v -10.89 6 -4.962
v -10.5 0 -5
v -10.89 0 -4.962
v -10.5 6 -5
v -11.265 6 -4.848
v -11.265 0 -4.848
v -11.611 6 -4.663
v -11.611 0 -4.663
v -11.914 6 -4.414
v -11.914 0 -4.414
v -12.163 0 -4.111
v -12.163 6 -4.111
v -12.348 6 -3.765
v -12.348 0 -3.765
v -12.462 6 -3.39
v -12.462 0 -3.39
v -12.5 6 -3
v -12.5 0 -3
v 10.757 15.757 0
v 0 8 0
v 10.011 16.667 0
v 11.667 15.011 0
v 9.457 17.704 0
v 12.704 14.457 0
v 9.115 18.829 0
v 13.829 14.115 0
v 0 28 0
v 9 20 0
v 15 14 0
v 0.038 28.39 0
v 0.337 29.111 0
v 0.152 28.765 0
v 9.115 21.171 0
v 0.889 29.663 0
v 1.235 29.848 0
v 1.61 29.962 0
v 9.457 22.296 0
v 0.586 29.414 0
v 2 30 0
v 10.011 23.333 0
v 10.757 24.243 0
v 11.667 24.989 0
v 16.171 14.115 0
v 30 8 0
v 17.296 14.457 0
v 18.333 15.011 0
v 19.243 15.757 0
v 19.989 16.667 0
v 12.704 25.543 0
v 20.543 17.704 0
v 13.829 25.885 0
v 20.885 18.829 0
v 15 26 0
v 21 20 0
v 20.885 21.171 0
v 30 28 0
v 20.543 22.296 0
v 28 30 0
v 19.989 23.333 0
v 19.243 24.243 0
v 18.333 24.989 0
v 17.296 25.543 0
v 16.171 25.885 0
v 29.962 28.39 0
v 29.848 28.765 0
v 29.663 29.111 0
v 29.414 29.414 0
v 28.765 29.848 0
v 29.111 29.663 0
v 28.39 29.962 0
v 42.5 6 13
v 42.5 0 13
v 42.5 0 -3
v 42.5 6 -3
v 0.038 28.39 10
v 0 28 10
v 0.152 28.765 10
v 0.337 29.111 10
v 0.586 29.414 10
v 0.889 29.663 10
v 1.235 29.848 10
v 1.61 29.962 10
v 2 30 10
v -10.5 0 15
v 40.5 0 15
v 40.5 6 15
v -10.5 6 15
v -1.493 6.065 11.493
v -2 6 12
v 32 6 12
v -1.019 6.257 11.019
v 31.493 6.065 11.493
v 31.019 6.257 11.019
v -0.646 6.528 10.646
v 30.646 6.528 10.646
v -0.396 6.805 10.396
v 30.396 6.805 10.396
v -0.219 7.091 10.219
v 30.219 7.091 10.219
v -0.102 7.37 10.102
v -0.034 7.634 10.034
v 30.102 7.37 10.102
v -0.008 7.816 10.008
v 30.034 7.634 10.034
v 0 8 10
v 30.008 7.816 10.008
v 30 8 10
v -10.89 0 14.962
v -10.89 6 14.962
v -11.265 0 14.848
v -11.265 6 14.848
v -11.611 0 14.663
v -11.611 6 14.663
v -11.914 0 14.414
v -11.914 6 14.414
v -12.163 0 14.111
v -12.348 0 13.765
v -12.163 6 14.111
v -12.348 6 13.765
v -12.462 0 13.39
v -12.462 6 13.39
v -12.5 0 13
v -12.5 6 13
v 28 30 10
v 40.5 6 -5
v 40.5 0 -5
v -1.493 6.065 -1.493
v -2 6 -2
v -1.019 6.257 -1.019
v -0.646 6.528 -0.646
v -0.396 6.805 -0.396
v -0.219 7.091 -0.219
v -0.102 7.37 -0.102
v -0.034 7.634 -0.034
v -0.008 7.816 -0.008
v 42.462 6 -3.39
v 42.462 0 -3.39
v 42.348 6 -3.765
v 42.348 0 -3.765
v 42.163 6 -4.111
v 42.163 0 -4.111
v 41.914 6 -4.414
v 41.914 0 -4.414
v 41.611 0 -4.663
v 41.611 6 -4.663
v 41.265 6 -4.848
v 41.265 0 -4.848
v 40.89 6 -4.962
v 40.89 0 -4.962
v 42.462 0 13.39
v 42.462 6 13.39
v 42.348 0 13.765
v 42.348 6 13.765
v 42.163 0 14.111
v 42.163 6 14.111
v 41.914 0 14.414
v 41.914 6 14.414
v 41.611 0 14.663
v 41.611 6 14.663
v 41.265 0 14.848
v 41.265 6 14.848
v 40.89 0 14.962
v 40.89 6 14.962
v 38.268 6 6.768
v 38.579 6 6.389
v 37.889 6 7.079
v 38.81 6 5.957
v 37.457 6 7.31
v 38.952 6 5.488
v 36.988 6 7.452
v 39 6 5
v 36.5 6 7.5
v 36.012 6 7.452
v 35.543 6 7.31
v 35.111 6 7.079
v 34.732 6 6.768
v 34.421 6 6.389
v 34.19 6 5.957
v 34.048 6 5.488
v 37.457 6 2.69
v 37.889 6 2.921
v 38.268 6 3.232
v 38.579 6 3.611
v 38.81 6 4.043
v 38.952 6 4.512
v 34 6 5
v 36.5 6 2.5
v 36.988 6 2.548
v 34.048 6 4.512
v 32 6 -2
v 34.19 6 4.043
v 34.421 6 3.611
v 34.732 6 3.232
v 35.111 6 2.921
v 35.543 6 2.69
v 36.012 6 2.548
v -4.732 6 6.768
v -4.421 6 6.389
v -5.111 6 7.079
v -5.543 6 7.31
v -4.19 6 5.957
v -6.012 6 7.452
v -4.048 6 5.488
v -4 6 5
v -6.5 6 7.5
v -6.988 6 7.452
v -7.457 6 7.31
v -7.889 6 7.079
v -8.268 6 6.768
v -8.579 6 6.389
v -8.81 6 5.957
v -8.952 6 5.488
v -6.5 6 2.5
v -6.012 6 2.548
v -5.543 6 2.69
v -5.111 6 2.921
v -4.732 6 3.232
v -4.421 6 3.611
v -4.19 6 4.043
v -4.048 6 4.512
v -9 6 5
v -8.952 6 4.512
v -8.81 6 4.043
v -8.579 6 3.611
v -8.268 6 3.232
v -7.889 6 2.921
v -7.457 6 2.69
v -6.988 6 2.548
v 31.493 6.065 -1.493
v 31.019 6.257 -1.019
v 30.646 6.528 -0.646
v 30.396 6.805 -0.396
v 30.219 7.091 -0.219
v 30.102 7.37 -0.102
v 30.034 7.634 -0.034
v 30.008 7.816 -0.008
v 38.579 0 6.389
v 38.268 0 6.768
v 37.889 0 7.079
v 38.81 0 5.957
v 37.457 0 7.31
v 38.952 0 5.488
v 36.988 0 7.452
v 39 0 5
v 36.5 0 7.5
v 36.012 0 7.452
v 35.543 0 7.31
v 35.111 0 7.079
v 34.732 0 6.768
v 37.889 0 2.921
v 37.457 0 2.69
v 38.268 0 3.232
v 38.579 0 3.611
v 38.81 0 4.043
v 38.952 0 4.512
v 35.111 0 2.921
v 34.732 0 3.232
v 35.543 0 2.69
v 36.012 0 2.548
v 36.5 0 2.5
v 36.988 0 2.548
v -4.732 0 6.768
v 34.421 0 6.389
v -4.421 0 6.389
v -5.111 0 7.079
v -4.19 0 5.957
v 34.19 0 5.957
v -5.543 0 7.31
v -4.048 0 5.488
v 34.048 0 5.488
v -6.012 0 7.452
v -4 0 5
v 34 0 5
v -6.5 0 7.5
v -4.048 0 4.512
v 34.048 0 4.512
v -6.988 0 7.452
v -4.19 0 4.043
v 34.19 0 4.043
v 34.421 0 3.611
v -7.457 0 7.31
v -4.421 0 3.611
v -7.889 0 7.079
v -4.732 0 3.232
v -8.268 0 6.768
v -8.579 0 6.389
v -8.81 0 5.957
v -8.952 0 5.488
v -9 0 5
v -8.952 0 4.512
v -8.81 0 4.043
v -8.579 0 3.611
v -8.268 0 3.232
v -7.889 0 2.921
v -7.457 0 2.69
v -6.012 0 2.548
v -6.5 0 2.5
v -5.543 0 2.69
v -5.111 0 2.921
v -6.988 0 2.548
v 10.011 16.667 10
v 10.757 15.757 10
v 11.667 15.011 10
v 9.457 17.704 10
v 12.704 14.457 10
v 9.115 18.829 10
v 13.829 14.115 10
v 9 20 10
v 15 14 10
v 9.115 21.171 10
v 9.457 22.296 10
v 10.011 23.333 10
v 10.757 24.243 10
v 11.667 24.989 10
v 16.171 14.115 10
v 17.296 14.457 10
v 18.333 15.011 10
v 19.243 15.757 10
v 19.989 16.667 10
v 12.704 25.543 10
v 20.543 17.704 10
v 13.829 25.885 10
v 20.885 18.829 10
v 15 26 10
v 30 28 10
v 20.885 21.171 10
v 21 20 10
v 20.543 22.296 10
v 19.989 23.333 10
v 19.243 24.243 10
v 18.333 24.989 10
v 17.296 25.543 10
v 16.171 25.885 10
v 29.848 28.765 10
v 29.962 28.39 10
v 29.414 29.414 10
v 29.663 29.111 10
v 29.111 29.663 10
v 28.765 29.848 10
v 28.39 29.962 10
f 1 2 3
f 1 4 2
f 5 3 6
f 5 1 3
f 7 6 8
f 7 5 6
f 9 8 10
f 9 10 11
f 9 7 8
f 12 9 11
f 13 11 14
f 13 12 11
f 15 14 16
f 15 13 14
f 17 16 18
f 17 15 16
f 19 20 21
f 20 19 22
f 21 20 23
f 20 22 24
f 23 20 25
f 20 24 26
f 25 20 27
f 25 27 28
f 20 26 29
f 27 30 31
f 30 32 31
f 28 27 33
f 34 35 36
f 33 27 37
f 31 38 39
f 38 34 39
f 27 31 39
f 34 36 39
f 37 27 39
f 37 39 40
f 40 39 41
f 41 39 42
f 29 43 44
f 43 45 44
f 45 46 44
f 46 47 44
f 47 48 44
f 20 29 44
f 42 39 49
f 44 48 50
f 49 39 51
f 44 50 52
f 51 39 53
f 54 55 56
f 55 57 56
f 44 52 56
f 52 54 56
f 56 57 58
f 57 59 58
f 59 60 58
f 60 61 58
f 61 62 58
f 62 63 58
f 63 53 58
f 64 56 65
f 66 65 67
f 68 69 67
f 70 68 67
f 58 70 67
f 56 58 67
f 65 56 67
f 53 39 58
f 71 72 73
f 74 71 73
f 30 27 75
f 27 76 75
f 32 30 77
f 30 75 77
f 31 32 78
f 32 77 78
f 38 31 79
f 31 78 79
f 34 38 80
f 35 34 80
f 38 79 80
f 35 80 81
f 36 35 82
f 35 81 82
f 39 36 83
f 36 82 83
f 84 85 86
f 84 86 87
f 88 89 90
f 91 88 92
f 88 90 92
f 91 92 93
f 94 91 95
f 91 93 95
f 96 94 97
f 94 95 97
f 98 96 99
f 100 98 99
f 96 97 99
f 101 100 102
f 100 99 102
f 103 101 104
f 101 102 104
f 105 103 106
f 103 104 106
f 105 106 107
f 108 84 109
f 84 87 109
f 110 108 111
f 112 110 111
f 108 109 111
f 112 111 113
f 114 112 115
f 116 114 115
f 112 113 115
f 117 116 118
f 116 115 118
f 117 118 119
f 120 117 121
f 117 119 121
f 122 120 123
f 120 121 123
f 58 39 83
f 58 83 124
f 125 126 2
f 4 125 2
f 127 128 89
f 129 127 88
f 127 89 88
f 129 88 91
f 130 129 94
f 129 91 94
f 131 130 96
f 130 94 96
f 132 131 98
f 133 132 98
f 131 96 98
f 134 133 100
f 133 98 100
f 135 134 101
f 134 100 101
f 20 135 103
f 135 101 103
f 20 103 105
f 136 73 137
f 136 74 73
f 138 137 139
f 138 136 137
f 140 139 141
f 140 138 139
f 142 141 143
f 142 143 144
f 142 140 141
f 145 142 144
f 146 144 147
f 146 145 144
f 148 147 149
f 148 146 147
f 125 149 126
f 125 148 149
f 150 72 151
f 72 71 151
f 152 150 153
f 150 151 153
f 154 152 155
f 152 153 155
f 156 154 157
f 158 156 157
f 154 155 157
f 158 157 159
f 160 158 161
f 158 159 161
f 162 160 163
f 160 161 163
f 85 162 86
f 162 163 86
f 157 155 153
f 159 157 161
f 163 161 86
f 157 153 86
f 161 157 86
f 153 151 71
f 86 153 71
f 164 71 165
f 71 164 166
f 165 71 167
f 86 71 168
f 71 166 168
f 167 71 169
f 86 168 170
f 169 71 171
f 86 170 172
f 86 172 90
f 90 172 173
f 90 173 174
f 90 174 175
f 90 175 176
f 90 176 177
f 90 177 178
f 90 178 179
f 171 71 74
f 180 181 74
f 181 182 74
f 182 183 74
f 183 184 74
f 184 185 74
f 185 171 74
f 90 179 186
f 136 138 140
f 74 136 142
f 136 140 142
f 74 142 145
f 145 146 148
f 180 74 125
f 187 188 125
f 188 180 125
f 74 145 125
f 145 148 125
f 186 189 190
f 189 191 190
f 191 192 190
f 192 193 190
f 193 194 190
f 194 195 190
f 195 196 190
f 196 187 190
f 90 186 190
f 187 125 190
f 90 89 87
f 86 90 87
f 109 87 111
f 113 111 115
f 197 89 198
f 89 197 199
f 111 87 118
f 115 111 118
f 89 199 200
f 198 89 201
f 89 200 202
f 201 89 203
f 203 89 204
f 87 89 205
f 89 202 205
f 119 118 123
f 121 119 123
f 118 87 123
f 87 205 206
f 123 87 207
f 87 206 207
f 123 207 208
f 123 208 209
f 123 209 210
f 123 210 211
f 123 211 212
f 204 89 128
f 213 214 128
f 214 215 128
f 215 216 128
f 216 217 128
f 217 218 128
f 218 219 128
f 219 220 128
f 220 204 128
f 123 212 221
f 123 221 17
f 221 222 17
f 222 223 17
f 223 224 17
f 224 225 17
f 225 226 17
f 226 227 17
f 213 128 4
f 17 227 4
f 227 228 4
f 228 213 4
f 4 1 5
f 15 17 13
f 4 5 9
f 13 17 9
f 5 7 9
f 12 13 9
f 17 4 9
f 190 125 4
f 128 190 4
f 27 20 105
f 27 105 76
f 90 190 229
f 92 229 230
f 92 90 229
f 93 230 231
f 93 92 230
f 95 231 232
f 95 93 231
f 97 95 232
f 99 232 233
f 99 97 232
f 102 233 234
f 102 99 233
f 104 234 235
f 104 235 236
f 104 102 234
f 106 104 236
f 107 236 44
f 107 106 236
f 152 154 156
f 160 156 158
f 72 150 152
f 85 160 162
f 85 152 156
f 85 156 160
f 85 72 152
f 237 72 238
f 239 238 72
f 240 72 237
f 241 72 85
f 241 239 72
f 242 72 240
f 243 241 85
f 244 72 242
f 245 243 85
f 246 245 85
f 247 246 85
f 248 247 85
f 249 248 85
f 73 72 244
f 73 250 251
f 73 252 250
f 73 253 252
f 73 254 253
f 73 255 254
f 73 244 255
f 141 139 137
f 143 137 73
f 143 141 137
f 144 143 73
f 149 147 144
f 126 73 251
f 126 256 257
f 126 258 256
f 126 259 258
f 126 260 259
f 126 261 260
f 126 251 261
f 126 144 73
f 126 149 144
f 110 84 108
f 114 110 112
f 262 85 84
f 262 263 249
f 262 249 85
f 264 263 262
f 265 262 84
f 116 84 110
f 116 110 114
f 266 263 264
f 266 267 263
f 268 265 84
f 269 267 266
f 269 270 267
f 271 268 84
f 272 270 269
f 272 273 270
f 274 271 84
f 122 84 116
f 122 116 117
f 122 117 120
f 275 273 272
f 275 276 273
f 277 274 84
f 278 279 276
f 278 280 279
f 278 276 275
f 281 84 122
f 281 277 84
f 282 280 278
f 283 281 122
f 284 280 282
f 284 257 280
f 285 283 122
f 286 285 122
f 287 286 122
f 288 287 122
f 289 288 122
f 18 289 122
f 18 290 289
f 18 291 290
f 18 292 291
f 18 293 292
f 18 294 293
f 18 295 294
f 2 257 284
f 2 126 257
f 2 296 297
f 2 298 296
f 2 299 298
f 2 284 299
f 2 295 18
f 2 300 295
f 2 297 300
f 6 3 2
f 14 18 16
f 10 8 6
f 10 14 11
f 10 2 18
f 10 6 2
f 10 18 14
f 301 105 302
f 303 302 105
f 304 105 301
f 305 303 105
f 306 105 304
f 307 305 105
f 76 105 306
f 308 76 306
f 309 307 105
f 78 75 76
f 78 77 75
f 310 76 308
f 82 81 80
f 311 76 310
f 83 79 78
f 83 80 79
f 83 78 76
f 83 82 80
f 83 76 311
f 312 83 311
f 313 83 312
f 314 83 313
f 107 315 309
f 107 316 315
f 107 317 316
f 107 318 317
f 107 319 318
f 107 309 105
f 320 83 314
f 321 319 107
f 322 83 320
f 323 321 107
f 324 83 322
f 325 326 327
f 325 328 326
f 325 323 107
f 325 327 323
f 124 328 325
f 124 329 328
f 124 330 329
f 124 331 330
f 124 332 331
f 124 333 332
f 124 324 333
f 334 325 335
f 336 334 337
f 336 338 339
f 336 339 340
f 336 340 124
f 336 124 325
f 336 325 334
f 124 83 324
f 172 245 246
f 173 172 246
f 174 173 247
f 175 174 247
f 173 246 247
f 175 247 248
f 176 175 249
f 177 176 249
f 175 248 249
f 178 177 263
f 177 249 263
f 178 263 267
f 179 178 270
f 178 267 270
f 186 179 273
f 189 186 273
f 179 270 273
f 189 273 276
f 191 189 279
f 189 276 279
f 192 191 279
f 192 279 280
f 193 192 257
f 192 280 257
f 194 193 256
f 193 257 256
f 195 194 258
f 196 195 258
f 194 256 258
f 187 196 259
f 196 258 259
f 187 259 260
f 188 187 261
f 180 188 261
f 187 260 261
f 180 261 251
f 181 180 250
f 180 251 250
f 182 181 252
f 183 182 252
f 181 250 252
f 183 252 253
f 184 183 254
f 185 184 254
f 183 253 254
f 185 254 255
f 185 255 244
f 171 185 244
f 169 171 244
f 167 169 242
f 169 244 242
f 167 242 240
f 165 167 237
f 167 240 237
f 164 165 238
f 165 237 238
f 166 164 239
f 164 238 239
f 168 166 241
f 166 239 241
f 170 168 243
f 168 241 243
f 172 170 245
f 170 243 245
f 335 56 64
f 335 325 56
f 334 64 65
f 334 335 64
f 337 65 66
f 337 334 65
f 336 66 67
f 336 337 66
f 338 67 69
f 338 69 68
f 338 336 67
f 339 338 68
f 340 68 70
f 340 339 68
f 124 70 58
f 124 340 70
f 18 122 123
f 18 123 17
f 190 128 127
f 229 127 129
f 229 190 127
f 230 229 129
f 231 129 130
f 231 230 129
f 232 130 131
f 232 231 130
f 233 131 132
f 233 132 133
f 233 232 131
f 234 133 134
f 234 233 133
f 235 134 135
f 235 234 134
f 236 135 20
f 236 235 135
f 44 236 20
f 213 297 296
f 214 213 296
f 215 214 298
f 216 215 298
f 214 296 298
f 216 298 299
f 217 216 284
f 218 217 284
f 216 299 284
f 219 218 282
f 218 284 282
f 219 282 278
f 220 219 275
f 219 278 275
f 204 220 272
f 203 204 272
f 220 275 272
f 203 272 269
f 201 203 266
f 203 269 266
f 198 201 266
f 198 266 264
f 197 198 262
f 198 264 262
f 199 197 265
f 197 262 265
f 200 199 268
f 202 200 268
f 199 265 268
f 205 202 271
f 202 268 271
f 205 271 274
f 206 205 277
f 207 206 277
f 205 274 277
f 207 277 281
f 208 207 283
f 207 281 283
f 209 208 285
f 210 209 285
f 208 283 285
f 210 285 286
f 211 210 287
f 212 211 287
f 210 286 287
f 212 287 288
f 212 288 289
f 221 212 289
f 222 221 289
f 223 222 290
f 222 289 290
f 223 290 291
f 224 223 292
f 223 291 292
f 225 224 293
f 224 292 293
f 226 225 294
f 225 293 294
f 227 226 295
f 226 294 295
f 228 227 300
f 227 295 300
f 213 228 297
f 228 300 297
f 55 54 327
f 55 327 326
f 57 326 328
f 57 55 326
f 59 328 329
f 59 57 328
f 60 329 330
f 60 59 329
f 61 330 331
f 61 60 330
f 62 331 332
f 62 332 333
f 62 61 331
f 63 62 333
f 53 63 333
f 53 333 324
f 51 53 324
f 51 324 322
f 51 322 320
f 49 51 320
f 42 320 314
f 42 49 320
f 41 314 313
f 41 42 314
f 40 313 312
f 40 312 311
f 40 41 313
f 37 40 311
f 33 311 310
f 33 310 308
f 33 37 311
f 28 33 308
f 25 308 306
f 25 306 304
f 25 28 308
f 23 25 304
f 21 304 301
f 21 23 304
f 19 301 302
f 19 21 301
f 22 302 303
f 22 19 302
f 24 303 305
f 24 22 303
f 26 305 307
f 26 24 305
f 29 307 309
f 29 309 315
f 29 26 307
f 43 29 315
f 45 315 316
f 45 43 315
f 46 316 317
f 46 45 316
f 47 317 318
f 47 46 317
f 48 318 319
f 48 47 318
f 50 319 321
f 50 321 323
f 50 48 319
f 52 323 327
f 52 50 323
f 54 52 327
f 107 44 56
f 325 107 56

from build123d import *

# Parameters (mm, degrees)
SKETCH1_W           = 30
SKETCH1_H           = 30
SKETCH1_R           = 6
BOSS_EXTRUDE1_DEPTH = 10
SKETCH2_W           = 55
SKETCH2_H           = 20
SKETCH2_R           = 2.5
BOSS_EXTRUDE2_DEPTH = 6
FILLET1_R           = 2


with BuildPart() as part:
    # Sketch1 → Boss-Extrude1 (new body)
    with BuildSketch(Plane.XY):
        with Locations((15, 15)):
            Rectangle(SKETCH1_W, SKETCH1_H)
        with Locations((15, 20)):
            Circle(SKETCH1_R, mode=Mode.SUBTRACT)
    extrude(amount=BOSS_EXTRUDE1_DEPTH)

    # Sketch2 → Boss-Extrude2 (add)
    with BuildSketch(Plane(origin=(0, 0, 0), x_dir=(-1, 0, 0), z_dir=(0, -1, 0))):
        with Locations((-15, -5)):
            Rectangle(SKETCH2_W, SKETCH2_H)
        with Locations(Location((6.5, -5, 0), (0, 0, 90))):
            Circle(SKETCH2_R, mode=Mode.SUBTRACT)
        with Locations(Location((-36.5, -5, 0), (0, 0, 270))):
            Circle(SKETCH2_R, mode=Mode.SUBTRACT)
    extrude(amount=-BOSS_EXTRUDE2_DEPTH)

    # Fillet1
    fillet1_edges = [part.edges().sort_by_distance(p)[0] for p in [
        (30, 6, 5),
        (15, 6, 10),
        (0, 6, 5),
        (42.5, 3, 15),
        (42.5, 3, -5),
        (-12.5, 3, -5),
        (-12.5, 3, 15),
        (15, 6, 0),
        (0, 30, 5),
        (30, 30, 5),
    ]]
    fillet(fillet1_edges, radius=FILLET1_R)


solid = part.part
